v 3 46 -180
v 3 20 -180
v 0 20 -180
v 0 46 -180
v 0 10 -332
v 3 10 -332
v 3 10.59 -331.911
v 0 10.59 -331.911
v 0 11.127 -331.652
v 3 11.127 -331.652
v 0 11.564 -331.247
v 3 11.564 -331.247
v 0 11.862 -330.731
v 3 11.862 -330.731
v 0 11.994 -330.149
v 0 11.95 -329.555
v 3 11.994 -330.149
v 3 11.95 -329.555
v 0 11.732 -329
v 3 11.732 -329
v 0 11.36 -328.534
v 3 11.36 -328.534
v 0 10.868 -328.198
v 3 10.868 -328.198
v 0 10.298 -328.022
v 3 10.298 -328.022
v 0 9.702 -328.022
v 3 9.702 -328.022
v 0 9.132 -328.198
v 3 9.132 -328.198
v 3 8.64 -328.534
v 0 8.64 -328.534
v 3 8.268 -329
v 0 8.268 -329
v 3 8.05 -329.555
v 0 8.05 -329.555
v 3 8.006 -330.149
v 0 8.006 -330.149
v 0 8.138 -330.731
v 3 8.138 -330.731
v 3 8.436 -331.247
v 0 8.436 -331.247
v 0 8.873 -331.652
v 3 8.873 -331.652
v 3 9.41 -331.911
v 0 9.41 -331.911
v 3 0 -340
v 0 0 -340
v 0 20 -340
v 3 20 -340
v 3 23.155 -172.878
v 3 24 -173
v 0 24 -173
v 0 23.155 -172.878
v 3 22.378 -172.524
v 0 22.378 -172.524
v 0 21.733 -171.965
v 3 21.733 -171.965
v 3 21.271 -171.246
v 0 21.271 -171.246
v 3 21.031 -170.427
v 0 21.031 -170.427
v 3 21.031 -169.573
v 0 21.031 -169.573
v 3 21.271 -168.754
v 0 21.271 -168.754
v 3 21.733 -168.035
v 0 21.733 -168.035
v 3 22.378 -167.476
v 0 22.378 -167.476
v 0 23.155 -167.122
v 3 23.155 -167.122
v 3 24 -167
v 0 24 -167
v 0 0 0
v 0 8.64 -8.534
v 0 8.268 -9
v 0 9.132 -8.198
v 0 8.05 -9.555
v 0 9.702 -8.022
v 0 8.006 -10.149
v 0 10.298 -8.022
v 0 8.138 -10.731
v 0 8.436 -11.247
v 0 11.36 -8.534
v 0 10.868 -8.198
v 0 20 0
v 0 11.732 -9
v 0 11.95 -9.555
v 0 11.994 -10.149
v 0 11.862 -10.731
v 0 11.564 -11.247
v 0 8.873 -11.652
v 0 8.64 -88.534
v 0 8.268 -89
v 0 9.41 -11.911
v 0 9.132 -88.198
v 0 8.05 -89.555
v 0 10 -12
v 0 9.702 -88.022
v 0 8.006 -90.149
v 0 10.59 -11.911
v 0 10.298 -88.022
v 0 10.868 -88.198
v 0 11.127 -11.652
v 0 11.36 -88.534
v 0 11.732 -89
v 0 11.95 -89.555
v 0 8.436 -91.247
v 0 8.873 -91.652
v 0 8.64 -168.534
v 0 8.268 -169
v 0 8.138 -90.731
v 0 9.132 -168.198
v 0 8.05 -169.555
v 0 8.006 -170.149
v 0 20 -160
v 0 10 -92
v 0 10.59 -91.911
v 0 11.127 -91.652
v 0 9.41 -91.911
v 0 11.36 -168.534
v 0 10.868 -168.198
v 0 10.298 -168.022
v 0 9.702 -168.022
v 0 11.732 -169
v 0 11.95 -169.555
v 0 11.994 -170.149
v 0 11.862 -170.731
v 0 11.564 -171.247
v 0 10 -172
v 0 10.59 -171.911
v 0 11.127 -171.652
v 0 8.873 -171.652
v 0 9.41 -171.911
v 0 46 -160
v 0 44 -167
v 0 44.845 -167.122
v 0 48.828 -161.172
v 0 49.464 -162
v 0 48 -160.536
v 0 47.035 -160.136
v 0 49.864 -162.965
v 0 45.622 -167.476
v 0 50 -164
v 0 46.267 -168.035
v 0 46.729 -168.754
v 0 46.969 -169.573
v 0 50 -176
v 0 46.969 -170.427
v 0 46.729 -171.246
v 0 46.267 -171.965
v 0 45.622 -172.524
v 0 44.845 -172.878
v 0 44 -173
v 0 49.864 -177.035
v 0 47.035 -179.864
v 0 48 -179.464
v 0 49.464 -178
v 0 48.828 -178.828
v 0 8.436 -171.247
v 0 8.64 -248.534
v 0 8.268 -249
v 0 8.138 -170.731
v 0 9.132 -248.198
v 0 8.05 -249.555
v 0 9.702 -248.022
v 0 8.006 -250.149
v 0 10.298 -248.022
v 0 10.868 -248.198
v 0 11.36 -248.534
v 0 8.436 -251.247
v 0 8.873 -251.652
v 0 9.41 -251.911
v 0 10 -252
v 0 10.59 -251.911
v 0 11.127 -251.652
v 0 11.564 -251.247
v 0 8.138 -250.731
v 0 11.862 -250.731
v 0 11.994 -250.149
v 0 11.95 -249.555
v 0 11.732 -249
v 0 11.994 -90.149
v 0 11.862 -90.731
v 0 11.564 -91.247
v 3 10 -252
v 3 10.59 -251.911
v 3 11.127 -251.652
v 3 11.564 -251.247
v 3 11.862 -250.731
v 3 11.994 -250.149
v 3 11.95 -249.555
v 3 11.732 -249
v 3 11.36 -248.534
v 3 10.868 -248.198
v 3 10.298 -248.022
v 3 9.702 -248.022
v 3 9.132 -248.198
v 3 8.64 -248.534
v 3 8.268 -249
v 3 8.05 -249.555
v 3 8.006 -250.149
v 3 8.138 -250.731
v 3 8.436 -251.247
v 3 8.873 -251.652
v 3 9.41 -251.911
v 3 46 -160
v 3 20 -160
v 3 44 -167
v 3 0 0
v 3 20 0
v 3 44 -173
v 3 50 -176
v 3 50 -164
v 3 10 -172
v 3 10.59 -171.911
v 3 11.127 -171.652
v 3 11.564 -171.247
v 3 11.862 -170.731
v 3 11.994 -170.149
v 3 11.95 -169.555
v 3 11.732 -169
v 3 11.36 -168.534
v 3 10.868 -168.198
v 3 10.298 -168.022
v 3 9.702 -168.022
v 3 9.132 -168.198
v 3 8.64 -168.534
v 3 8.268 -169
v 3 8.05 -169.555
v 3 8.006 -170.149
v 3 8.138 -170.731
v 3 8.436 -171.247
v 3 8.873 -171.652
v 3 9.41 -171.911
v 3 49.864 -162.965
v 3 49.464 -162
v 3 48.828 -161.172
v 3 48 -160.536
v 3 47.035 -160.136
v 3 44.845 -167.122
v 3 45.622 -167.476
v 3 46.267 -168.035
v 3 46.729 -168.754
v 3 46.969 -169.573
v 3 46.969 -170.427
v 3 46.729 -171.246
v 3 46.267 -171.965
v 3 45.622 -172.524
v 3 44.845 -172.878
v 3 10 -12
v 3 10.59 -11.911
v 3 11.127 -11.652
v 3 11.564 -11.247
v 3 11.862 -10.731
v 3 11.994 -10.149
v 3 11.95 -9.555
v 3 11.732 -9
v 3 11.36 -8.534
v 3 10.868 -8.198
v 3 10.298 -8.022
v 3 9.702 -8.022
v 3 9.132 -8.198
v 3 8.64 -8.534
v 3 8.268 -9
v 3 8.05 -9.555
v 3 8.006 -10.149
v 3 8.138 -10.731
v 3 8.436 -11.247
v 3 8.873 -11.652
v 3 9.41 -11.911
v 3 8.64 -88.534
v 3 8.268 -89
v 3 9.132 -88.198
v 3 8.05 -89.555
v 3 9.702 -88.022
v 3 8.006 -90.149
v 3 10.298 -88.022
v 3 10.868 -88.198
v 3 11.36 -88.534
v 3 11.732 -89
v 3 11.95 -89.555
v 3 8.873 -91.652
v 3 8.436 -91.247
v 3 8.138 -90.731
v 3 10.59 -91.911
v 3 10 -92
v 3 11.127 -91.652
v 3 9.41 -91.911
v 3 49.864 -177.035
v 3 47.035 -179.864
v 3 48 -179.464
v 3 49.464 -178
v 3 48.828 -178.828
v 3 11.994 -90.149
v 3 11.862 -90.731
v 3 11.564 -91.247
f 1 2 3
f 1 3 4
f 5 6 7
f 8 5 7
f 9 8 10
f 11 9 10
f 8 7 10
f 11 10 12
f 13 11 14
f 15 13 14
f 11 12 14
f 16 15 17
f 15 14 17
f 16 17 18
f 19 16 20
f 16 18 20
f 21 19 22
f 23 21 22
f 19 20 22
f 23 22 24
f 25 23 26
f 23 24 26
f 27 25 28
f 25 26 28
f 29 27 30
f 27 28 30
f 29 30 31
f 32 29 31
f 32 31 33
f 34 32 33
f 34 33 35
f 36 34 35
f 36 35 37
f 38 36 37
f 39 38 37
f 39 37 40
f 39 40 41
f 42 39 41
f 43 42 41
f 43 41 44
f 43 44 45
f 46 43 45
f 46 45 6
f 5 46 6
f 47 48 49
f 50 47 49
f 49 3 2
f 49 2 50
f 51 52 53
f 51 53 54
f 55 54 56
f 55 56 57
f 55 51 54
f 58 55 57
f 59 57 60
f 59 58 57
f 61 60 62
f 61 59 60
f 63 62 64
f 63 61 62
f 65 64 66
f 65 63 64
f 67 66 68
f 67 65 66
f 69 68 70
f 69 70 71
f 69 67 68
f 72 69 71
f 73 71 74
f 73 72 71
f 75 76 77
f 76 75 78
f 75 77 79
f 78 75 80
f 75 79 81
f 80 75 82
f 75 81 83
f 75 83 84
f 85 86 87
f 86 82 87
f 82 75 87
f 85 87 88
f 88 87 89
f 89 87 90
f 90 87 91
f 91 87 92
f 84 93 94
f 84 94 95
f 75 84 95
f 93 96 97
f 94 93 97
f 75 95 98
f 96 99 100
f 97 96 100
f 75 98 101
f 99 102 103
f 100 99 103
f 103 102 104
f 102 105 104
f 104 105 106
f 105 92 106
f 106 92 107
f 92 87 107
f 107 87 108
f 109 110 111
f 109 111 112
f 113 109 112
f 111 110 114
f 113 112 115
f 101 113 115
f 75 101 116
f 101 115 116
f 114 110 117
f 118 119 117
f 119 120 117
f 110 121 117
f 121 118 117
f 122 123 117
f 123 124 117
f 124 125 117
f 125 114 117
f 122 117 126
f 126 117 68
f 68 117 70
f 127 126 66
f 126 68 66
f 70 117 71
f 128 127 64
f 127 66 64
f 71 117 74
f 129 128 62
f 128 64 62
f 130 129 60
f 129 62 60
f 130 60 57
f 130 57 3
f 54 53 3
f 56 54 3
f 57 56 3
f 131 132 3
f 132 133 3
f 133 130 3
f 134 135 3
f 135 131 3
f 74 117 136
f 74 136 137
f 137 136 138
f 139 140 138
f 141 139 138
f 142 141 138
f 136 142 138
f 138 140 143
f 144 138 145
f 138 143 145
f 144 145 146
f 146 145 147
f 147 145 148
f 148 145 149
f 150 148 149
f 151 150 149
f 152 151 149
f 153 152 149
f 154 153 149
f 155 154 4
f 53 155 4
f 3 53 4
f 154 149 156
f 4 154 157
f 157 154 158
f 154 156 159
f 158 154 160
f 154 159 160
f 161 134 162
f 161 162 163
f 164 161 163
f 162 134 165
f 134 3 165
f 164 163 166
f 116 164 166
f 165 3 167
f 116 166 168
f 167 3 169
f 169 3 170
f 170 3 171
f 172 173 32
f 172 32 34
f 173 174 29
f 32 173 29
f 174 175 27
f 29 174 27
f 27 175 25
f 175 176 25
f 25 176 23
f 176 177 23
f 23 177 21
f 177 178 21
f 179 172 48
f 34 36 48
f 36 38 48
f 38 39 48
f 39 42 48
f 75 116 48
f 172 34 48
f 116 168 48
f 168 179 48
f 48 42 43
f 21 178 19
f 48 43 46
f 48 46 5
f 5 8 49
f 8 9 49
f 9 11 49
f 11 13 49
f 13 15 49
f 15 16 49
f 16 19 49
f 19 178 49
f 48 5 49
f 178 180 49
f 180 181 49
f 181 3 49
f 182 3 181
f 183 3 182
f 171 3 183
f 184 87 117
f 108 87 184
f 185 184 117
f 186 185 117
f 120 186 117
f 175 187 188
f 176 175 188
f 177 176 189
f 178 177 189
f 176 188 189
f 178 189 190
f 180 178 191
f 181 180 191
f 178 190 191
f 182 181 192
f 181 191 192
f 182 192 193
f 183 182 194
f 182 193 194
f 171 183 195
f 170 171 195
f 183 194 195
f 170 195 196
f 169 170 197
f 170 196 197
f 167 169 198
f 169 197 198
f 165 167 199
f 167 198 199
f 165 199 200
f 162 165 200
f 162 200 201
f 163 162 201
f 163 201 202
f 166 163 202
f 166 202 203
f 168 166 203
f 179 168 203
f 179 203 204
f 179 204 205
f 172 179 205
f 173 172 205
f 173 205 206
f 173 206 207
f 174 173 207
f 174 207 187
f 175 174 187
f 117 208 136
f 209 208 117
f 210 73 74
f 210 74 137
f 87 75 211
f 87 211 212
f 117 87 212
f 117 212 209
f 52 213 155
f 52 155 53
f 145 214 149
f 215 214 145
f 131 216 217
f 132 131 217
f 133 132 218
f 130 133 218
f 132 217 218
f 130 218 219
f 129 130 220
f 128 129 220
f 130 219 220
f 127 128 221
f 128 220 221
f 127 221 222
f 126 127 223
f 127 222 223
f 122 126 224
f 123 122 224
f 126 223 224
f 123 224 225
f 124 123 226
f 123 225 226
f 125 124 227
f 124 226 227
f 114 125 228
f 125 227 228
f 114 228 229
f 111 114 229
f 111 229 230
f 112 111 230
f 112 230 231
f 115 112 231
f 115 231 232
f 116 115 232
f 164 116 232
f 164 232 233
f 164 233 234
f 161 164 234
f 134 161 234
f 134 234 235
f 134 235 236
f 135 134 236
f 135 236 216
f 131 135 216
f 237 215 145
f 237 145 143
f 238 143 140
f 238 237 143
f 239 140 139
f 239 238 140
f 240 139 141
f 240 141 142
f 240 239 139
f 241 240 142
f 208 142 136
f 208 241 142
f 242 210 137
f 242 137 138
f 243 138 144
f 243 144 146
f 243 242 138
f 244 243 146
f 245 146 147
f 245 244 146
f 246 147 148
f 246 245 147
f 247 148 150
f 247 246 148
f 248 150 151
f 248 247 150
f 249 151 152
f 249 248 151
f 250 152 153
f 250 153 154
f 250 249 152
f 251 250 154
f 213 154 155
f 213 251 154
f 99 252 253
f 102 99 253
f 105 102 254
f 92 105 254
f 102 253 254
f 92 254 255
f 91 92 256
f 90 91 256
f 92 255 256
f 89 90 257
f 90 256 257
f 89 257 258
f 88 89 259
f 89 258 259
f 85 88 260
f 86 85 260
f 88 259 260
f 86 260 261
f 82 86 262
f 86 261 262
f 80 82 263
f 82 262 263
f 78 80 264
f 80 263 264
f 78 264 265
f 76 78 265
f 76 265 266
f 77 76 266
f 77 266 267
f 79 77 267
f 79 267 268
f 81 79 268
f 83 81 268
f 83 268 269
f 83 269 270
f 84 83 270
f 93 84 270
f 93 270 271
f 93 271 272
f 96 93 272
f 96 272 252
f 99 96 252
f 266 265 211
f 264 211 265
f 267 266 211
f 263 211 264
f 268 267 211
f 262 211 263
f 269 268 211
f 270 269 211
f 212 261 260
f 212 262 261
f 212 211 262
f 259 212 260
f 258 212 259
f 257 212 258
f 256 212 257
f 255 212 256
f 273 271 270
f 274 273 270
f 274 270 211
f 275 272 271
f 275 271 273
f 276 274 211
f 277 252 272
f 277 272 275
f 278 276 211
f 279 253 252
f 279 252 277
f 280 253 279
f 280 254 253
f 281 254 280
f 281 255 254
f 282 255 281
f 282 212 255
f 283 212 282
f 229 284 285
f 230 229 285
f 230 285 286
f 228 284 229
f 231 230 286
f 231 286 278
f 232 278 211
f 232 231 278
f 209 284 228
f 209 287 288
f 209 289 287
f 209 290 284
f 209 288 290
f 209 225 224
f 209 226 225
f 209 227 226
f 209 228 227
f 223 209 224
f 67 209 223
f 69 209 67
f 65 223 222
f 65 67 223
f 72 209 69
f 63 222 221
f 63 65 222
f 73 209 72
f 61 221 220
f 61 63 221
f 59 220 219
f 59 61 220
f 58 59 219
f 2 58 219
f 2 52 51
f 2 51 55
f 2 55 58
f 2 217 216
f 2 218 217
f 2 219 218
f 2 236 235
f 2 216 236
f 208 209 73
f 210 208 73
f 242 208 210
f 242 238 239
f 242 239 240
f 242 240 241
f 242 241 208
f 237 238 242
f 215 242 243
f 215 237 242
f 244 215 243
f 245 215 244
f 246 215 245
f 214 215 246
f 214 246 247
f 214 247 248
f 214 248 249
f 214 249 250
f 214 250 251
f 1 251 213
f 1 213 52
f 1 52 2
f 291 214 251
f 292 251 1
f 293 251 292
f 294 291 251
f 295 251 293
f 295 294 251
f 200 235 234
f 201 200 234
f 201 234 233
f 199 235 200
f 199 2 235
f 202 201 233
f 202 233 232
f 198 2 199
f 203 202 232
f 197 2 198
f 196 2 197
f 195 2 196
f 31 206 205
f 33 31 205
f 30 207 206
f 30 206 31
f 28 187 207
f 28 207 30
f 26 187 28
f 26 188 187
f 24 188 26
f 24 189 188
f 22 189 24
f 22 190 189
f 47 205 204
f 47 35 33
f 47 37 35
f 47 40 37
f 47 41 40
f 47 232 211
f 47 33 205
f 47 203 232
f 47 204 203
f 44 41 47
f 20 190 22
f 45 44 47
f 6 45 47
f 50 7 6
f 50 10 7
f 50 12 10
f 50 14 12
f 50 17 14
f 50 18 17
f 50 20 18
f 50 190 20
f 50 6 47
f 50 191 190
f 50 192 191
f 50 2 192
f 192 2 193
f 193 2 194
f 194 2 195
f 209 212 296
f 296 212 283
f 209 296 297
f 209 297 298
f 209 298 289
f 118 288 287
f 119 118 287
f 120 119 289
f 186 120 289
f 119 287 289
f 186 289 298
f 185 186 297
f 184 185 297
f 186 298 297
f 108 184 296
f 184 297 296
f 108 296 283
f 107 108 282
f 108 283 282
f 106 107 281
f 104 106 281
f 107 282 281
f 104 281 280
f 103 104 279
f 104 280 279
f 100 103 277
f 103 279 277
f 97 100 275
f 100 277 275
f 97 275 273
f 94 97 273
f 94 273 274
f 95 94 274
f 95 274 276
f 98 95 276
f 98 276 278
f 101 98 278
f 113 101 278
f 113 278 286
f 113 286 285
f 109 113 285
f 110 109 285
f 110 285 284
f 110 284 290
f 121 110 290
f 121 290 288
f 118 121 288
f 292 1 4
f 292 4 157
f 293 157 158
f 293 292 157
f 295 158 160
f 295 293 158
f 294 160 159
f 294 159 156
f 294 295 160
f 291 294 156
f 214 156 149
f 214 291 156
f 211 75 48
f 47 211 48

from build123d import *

# Parameters (mm, degrees)
SKETCH1_W           = 340
SKETCH1_H           = 20
BOSS_EXTRUDE1_DEPTH = 3
SKETCH2_R           = 2
CUT_EXTRUDE1_DEPTH  = 10
BOSS_EXTRUDE4_DEPTH = 3


with BuildPart() as part:
    # Sketch1 → Boss-Extrude1 (new body)
    with BuildSketch(Plane(origin=(0, 0, 0), x_dir=(0, 0, -1), z_dir=(1, 0, 0))):
        with Locations((170, 10)):
            Rectangle(SKETCH1_W, SKETCH1_H)
    extrude(amount=BOSS_EXTRUDE1_DEPTH)

    # Sketch2 → Cut-Extrude1 (cut)
    with BuildSketch(Plane(origin=(3, 0, 0), x_dir=(0, 0, -1), z_dir=(1, 0, 0))):
        with Locations((10, 10)):
            Circle(SKETCH2_R)
        with Locations((90, 10)):
            Circle(SKETCH2_R)
        with Locations((170, 10)):
            Circle(SKETCH2_R)
        with Locations((250, 10)):
            Circle(SKETCH2_R)
        with Locations((330, 10)):
            Circle(SKETCH2_R)
    extrude(amount=-CUT_EXTRUDE1_DEPTH, mode=Mode.SUBTRACT)

    # Sketch3 → Boss-Extrude4 (add)
    with BuildSketch(Plane(origin=(3, 0, 0), x_dir=(0, 0, -1), z_dir=(1, 0, 0))):
        with BuildLine():
            Line((160, 46), (160, 20))
            Line((160, 20), (180, 20))
            Line((180, 20), (180, 46))
            ThreePointArc((180, 46), (178.828427125, 48.828427125), (176, 50))
            Line((176, 50), (164, 50))
            ThreePointArc((164, 50), (161.171572875, 48.828427125), (160, 46))
        make_face()
        with BuildLine():
            ThreePointArc((167, 44), (170, 47), (173, 44))
            Line((173, 44), (173, 24))
            ThreePointArc((173, 24), (170, 21), (167, 24))
            Line((167, 24), (167, 44))
        make_face(mode=Mode.SUBTRACT)
    extrude(amount=-BOSS_EXTRUDE4_DEPTH)


solid = part.part
